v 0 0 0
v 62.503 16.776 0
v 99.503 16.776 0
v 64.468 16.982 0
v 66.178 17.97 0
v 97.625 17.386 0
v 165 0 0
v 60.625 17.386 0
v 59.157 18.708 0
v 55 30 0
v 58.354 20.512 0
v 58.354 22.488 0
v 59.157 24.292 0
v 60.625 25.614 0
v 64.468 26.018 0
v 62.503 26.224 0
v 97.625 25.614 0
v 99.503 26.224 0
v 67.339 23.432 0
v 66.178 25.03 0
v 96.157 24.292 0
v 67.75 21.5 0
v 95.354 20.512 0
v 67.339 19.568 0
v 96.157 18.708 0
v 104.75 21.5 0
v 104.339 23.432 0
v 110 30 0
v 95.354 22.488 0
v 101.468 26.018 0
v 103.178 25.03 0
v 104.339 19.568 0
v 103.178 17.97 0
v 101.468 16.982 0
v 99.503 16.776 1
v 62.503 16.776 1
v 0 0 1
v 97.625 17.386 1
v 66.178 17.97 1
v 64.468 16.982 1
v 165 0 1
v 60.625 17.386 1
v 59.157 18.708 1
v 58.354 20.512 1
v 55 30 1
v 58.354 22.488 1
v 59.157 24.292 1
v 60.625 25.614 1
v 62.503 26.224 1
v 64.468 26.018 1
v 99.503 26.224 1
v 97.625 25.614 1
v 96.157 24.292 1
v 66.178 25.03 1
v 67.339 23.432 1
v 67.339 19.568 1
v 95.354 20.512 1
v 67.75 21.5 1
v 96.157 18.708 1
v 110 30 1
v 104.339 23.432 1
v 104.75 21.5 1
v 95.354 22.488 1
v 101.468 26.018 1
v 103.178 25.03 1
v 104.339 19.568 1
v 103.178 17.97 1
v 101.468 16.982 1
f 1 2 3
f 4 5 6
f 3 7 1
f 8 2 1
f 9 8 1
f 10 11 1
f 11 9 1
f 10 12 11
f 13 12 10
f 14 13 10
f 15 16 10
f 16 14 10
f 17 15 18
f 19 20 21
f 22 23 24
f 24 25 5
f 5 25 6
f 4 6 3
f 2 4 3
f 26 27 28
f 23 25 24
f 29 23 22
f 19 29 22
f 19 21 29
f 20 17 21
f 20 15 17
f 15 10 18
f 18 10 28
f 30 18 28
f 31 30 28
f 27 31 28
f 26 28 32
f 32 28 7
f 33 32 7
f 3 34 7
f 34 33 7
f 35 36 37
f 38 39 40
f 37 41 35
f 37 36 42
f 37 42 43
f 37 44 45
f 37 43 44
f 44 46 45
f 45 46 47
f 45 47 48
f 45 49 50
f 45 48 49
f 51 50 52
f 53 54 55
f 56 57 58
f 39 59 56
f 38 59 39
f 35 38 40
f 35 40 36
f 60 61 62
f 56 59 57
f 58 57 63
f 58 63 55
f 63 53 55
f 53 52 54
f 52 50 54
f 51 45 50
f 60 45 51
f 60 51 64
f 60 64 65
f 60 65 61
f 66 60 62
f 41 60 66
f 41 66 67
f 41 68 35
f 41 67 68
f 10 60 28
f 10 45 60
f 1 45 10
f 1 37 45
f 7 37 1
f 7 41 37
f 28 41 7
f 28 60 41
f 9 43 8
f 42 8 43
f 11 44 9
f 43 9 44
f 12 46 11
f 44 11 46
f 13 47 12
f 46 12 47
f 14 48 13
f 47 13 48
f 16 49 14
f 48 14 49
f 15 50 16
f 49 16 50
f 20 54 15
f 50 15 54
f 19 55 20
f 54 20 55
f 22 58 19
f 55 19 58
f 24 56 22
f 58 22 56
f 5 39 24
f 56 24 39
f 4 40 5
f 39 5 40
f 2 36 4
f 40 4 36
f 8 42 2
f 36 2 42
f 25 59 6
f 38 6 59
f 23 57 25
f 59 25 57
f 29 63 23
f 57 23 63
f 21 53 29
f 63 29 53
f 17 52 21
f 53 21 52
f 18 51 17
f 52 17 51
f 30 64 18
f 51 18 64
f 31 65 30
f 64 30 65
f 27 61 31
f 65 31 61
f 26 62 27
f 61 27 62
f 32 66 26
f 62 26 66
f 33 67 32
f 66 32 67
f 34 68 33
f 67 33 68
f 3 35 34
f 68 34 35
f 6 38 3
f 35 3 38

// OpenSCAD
_w=175;
w_corr=-10;
w=_w+w_corr;
h=130;
d1=3;
d2=9.5;


front_poly = [
    [0,0], [w,0],
    [w,h-12], [w-12,h],
    [0,h], 
    
];

cut_poly =  [
    [0,0], [55,30],
    [w-55,30], [w,0],
];

if (0)
difference() {
    linear_extrude(height=2.5) {
        difference() {
            polygon(front_poly);
            translate([2.5,10.8]) circle(d=d1);
            translate([w-2.5,10.8]) circle(d=d1);
            translate([2.5,h-4.5]) circle(d=d1);
            translate([w-2.5,h-15.5]) circle(d=d1);
            translate([31,29]) circle(d=d2);
            translate([68,21.5]) circle(d=d2);
            translate([105,21.5]) circle(d=d2);
            translate([w-31,29]) circle(d=d2);
        }
    }
    translate([0, 0, 1.5]) {
        linear_extrude(height=1) {
            polygon(cut_poly);
        }
    }
}

if (1)
linear_extrude(height=1) {
    difference() {
        polygon(cut_poly);
        translate([w_corr/2,0,0]) {
            translate([68,21.5]) circle(d=d2);
            translate([105,21.5]) circle(d=d2);
        }
    }
}
